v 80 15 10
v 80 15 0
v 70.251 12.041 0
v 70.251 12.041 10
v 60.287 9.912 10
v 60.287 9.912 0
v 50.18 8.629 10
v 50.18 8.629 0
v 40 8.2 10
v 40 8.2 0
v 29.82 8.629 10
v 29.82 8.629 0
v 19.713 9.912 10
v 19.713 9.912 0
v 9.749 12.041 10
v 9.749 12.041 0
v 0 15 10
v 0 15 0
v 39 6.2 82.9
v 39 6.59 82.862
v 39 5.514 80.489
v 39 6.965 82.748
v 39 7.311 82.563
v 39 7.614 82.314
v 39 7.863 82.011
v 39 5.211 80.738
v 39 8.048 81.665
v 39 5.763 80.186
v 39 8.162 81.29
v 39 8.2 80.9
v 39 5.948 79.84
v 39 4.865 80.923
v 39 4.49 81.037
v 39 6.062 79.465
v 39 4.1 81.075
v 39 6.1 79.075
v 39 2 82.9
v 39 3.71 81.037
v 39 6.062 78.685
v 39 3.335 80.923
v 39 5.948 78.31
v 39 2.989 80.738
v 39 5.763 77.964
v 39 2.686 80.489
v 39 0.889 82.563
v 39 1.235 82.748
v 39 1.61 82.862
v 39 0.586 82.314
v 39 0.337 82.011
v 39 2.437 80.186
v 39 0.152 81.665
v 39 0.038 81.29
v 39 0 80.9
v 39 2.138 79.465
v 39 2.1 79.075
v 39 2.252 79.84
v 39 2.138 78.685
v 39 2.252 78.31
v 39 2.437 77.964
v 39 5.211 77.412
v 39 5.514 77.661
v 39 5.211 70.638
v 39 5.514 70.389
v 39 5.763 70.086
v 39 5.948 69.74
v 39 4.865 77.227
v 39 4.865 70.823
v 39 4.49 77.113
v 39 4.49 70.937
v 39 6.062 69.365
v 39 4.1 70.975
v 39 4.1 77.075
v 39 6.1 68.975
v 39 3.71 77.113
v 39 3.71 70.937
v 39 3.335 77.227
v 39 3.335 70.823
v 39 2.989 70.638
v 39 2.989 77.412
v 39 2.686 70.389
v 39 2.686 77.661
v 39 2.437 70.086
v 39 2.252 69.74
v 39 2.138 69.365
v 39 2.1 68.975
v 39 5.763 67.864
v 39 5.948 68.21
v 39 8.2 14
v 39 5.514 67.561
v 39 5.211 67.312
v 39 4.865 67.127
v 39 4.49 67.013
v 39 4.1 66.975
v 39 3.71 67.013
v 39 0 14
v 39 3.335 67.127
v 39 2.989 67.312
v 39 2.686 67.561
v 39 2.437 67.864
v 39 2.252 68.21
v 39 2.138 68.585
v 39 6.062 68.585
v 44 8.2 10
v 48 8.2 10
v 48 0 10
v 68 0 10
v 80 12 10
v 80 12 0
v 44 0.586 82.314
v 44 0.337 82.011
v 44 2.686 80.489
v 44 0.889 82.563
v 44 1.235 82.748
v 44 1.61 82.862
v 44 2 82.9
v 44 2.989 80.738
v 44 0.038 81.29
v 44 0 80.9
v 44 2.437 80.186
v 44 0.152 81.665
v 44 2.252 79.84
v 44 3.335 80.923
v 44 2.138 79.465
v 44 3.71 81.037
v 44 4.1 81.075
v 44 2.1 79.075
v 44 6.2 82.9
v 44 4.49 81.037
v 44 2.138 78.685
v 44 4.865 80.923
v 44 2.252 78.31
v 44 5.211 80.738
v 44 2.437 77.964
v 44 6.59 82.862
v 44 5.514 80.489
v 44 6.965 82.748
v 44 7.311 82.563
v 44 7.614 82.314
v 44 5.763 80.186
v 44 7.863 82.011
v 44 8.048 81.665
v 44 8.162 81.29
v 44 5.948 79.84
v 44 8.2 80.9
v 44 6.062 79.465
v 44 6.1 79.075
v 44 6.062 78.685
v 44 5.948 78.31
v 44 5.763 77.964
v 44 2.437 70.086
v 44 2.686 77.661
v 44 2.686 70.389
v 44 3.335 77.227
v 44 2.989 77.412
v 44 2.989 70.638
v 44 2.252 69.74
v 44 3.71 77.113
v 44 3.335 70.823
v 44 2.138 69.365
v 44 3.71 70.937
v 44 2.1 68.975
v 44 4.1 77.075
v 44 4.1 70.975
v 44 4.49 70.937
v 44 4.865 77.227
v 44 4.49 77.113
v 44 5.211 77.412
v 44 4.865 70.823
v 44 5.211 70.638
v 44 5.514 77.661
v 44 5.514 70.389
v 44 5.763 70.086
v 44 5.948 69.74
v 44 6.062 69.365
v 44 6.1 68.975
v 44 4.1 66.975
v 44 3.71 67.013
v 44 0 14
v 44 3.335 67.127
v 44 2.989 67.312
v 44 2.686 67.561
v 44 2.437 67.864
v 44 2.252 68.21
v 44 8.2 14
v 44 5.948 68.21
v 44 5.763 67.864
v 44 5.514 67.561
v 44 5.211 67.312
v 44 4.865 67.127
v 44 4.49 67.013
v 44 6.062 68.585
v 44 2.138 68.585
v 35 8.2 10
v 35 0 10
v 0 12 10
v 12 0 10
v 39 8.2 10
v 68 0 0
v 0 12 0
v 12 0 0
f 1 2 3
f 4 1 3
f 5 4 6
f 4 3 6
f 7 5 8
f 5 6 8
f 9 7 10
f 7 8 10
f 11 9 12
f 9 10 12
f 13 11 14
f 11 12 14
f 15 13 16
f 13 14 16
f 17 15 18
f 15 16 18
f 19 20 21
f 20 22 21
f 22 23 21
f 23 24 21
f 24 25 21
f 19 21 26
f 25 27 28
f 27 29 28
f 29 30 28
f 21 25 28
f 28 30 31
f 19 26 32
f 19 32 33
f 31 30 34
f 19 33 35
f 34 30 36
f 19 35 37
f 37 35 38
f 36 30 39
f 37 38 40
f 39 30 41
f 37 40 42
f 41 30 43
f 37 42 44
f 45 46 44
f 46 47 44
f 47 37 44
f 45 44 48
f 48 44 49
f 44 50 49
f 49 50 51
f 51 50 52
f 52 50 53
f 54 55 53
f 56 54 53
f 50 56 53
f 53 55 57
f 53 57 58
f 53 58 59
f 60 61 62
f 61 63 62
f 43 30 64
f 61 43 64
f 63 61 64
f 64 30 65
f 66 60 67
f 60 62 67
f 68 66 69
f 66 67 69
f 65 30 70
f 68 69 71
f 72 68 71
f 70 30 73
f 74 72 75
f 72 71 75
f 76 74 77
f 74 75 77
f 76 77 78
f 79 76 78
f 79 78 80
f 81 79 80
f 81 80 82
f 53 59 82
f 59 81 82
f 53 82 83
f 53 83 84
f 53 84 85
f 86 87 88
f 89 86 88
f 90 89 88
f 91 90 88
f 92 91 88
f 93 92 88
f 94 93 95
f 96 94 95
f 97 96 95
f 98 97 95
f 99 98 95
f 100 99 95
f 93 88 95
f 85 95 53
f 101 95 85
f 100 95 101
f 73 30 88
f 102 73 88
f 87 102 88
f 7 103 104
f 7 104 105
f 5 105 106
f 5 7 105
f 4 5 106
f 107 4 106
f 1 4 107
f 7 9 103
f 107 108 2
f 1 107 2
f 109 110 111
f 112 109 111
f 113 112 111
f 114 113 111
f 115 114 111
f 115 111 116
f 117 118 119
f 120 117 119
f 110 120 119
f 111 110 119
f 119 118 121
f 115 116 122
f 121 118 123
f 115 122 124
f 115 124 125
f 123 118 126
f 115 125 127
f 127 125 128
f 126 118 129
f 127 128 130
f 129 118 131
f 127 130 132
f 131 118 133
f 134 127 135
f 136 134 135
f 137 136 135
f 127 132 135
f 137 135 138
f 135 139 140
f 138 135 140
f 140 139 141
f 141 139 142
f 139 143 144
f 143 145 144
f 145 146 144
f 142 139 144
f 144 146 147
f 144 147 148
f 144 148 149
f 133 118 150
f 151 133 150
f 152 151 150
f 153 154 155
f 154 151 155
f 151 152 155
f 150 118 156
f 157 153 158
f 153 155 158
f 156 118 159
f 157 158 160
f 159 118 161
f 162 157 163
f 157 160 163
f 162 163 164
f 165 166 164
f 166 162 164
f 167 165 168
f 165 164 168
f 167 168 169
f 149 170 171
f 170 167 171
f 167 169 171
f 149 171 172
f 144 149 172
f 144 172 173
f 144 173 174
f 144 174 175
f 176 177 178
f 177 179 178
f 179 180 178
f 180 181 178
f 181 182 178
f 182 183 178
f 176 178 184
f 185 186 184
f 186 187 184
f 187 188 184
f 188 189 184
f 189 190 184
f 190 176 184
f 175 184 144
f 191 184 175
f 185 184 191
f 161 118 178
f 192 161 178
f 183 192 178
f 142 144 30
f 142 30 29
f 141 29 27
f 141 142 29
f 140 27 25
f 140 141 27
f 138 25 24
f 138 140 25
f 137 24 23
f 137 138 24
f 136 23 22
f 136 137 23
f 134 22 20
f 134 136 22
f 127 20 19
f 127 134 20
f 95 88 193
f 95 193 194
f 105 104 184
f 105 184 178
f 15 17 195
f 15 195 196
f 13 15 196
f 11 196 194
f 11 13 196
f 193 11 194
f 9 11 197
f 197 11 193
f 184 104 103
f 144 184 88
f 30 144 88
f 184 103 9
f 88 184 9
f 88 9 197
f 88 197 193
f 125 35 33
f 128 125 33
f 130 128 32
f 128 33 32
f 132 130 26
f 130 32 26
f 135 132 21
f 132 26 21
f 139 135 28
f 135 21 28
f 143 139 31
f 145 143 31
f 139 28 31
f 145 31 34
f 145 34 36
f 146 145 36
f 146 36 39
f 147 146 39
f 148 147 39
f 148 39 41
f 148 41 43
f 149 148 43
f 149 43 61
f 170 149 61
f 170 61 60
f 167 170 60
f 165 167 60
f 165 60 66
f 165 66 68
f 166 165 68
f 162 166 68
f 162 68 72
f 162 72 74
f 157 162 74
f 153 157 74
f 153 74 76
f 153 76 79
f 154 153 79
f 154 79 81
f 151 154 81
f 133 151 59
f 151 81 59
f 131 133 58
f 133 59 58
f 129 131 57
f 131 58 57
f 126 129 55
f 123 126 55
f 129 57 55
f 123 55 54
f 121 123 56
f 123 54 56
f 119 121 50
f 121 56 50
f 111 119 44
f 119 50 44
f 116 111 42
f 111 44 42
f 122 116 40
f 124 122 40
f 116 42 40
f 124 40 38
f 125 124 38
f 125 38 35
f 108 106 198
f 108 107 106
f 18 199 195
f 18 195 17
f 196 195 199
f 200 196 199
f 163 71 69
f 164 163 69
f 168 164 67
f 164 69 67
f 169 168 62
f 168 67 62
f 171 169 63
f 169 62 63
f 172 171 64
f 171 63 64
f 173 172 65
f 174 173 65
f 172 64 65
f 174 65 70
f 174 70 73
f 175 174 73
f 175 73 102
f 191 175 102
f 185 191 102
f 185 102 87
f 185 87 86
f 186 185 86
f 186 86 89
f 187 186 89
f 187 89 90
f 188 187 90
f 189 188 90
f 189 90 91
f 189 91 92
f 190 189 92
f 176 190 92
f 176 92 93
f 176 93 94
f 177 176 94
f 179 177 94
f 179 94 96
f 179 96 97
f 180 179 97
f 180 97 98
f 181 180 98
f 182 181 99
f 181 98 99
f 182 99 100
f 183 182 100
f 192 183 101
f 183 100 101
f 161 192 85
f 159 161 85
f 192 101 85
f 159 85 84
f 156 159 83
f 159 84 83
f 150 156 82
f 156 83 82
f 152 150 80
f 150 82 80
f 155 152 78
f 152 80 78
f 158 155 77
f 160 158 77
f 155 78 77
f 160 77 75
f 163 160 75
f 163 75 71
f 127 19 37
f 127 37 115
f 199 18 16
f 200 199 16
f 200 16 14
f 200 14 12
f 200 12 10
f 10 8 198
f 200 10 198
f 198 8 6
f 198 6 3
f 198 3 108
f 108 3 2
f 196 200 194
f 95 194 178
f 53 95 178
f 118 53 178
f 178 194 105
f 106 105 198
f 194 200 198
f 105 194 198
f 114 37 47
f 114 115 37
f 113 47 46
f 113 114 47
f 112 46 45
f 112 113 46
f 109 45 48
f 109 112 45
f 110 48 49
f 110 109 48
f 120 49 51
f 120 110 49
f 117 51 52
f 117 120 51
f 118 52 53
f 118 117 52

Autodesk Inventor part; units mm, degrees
ref_plane "YZ Plane" through (0, 0, 0) normal (1, 0, 0) x (0, 1, 0)
ref_plane "XZ Plane" through (0, 0, 0) normal (0, 1, 0) x (-1, 0, 0)
ref_plane "XY Plane" through (0, 0, 0) normal (0, 0, 1) x (1, 0, 0)
sketch "Esquisse1" plane through (0, 0, 0) normal (0, 0, 1) x (1, 0, 0)
  line L0 (0, 0) -> (0, 15)
  line L1 (0, 0) -> (80, 0)
  line L2 (80, 0) -> (80, 15)
  arc A0 (0, 15) -> (80, 15) centre (40, 129.2471) ccw
  line L3 (0, 8.2) -> (80, 8.2) construction
  line L4 (40, 0) -> (40, 8.2) construction
  dimension "d0" = 15
  dimension "d1" = 80
  dimension "d28" = 8.2
extrude "Extrusion1" add sketch "Esquisse1" along normal blind 10
sketch "Esquisse2" plane through (0, 0, 10) normal (0, 0, 1) x (1, 0, 0)
  line L0 (0, 0) -> (80, 0) projected
  line L1 (39, 0) -> (44, 0)
  line L2 (44, 0) -> (44, 8.2)
  line L3 (44, 8.2) -> (39, 8.2)
  line L4 (39, 8.2) -> (39, 0)
  line L5 (0, 15) -> (0, 0) projected
  line L6 (0, 8.2) -> (80, 8.2) construction
  line L7 (80, 0) -> (80, 15) projected
  arc A0 (0, 15) -> (80, 15) centre (40, 129.2471) ccw projected
  line L8 (40, 0) -> (40, 8.2) construction
  dimension "d6" = 5
  dimension "d9" = 80
  dimension "d56" = 4
extrude "Extrusion2" add sketch "Esquisse2" along normal blind 72.9 contours L4 L3 L2 L0
sketch "Esquisse8" plane through (39, 0, 10) normal (-1, 0, 0) x (0, 0, 1)
  circle A0 centre (69.075, 4.1) radius 2
  circle A1 centre (58.975, 4.1) radius 2
  line L0 (0, 8.2) -> (72.9, 8.2) projected
  line L1 (0, 0) -> (72.9, 0) projected
  line L2 (72.9, 8.2) -> (72.9, 0) projected
  point P0 (-10, 0)
  dimension "d45" = 10.1
  dimension "d46" = 4
  dimension "d47" = 4
  dimension "d48" = 8.2
  dimension "d49" = 4.1
  dimension "d50" = 4.1
  dimension "d51" = 3.825
extrude "Extrusion8" cut sketch "Esquisse8" against normal up to surface (5 mm away)
chamfer "Chanfrein1" distance 4 angle 45 2 edges at (39, 4.1, 10) (44, 4.1, 10)
chamfer "Chanfrein2" distance 12 angle 45 2 edges at (0, 0, 5) (80, 0, 5)
fillet "Congé1" radius 2 2 edges at (41.5, 8.2, 82.9) (41.5, 0, 82.9)
equation "\"d47\" = d46"
equation "\"d49\" = 0.5 * d48"
equation "\"d50\" = d49"
properties part number "tete_statique"
